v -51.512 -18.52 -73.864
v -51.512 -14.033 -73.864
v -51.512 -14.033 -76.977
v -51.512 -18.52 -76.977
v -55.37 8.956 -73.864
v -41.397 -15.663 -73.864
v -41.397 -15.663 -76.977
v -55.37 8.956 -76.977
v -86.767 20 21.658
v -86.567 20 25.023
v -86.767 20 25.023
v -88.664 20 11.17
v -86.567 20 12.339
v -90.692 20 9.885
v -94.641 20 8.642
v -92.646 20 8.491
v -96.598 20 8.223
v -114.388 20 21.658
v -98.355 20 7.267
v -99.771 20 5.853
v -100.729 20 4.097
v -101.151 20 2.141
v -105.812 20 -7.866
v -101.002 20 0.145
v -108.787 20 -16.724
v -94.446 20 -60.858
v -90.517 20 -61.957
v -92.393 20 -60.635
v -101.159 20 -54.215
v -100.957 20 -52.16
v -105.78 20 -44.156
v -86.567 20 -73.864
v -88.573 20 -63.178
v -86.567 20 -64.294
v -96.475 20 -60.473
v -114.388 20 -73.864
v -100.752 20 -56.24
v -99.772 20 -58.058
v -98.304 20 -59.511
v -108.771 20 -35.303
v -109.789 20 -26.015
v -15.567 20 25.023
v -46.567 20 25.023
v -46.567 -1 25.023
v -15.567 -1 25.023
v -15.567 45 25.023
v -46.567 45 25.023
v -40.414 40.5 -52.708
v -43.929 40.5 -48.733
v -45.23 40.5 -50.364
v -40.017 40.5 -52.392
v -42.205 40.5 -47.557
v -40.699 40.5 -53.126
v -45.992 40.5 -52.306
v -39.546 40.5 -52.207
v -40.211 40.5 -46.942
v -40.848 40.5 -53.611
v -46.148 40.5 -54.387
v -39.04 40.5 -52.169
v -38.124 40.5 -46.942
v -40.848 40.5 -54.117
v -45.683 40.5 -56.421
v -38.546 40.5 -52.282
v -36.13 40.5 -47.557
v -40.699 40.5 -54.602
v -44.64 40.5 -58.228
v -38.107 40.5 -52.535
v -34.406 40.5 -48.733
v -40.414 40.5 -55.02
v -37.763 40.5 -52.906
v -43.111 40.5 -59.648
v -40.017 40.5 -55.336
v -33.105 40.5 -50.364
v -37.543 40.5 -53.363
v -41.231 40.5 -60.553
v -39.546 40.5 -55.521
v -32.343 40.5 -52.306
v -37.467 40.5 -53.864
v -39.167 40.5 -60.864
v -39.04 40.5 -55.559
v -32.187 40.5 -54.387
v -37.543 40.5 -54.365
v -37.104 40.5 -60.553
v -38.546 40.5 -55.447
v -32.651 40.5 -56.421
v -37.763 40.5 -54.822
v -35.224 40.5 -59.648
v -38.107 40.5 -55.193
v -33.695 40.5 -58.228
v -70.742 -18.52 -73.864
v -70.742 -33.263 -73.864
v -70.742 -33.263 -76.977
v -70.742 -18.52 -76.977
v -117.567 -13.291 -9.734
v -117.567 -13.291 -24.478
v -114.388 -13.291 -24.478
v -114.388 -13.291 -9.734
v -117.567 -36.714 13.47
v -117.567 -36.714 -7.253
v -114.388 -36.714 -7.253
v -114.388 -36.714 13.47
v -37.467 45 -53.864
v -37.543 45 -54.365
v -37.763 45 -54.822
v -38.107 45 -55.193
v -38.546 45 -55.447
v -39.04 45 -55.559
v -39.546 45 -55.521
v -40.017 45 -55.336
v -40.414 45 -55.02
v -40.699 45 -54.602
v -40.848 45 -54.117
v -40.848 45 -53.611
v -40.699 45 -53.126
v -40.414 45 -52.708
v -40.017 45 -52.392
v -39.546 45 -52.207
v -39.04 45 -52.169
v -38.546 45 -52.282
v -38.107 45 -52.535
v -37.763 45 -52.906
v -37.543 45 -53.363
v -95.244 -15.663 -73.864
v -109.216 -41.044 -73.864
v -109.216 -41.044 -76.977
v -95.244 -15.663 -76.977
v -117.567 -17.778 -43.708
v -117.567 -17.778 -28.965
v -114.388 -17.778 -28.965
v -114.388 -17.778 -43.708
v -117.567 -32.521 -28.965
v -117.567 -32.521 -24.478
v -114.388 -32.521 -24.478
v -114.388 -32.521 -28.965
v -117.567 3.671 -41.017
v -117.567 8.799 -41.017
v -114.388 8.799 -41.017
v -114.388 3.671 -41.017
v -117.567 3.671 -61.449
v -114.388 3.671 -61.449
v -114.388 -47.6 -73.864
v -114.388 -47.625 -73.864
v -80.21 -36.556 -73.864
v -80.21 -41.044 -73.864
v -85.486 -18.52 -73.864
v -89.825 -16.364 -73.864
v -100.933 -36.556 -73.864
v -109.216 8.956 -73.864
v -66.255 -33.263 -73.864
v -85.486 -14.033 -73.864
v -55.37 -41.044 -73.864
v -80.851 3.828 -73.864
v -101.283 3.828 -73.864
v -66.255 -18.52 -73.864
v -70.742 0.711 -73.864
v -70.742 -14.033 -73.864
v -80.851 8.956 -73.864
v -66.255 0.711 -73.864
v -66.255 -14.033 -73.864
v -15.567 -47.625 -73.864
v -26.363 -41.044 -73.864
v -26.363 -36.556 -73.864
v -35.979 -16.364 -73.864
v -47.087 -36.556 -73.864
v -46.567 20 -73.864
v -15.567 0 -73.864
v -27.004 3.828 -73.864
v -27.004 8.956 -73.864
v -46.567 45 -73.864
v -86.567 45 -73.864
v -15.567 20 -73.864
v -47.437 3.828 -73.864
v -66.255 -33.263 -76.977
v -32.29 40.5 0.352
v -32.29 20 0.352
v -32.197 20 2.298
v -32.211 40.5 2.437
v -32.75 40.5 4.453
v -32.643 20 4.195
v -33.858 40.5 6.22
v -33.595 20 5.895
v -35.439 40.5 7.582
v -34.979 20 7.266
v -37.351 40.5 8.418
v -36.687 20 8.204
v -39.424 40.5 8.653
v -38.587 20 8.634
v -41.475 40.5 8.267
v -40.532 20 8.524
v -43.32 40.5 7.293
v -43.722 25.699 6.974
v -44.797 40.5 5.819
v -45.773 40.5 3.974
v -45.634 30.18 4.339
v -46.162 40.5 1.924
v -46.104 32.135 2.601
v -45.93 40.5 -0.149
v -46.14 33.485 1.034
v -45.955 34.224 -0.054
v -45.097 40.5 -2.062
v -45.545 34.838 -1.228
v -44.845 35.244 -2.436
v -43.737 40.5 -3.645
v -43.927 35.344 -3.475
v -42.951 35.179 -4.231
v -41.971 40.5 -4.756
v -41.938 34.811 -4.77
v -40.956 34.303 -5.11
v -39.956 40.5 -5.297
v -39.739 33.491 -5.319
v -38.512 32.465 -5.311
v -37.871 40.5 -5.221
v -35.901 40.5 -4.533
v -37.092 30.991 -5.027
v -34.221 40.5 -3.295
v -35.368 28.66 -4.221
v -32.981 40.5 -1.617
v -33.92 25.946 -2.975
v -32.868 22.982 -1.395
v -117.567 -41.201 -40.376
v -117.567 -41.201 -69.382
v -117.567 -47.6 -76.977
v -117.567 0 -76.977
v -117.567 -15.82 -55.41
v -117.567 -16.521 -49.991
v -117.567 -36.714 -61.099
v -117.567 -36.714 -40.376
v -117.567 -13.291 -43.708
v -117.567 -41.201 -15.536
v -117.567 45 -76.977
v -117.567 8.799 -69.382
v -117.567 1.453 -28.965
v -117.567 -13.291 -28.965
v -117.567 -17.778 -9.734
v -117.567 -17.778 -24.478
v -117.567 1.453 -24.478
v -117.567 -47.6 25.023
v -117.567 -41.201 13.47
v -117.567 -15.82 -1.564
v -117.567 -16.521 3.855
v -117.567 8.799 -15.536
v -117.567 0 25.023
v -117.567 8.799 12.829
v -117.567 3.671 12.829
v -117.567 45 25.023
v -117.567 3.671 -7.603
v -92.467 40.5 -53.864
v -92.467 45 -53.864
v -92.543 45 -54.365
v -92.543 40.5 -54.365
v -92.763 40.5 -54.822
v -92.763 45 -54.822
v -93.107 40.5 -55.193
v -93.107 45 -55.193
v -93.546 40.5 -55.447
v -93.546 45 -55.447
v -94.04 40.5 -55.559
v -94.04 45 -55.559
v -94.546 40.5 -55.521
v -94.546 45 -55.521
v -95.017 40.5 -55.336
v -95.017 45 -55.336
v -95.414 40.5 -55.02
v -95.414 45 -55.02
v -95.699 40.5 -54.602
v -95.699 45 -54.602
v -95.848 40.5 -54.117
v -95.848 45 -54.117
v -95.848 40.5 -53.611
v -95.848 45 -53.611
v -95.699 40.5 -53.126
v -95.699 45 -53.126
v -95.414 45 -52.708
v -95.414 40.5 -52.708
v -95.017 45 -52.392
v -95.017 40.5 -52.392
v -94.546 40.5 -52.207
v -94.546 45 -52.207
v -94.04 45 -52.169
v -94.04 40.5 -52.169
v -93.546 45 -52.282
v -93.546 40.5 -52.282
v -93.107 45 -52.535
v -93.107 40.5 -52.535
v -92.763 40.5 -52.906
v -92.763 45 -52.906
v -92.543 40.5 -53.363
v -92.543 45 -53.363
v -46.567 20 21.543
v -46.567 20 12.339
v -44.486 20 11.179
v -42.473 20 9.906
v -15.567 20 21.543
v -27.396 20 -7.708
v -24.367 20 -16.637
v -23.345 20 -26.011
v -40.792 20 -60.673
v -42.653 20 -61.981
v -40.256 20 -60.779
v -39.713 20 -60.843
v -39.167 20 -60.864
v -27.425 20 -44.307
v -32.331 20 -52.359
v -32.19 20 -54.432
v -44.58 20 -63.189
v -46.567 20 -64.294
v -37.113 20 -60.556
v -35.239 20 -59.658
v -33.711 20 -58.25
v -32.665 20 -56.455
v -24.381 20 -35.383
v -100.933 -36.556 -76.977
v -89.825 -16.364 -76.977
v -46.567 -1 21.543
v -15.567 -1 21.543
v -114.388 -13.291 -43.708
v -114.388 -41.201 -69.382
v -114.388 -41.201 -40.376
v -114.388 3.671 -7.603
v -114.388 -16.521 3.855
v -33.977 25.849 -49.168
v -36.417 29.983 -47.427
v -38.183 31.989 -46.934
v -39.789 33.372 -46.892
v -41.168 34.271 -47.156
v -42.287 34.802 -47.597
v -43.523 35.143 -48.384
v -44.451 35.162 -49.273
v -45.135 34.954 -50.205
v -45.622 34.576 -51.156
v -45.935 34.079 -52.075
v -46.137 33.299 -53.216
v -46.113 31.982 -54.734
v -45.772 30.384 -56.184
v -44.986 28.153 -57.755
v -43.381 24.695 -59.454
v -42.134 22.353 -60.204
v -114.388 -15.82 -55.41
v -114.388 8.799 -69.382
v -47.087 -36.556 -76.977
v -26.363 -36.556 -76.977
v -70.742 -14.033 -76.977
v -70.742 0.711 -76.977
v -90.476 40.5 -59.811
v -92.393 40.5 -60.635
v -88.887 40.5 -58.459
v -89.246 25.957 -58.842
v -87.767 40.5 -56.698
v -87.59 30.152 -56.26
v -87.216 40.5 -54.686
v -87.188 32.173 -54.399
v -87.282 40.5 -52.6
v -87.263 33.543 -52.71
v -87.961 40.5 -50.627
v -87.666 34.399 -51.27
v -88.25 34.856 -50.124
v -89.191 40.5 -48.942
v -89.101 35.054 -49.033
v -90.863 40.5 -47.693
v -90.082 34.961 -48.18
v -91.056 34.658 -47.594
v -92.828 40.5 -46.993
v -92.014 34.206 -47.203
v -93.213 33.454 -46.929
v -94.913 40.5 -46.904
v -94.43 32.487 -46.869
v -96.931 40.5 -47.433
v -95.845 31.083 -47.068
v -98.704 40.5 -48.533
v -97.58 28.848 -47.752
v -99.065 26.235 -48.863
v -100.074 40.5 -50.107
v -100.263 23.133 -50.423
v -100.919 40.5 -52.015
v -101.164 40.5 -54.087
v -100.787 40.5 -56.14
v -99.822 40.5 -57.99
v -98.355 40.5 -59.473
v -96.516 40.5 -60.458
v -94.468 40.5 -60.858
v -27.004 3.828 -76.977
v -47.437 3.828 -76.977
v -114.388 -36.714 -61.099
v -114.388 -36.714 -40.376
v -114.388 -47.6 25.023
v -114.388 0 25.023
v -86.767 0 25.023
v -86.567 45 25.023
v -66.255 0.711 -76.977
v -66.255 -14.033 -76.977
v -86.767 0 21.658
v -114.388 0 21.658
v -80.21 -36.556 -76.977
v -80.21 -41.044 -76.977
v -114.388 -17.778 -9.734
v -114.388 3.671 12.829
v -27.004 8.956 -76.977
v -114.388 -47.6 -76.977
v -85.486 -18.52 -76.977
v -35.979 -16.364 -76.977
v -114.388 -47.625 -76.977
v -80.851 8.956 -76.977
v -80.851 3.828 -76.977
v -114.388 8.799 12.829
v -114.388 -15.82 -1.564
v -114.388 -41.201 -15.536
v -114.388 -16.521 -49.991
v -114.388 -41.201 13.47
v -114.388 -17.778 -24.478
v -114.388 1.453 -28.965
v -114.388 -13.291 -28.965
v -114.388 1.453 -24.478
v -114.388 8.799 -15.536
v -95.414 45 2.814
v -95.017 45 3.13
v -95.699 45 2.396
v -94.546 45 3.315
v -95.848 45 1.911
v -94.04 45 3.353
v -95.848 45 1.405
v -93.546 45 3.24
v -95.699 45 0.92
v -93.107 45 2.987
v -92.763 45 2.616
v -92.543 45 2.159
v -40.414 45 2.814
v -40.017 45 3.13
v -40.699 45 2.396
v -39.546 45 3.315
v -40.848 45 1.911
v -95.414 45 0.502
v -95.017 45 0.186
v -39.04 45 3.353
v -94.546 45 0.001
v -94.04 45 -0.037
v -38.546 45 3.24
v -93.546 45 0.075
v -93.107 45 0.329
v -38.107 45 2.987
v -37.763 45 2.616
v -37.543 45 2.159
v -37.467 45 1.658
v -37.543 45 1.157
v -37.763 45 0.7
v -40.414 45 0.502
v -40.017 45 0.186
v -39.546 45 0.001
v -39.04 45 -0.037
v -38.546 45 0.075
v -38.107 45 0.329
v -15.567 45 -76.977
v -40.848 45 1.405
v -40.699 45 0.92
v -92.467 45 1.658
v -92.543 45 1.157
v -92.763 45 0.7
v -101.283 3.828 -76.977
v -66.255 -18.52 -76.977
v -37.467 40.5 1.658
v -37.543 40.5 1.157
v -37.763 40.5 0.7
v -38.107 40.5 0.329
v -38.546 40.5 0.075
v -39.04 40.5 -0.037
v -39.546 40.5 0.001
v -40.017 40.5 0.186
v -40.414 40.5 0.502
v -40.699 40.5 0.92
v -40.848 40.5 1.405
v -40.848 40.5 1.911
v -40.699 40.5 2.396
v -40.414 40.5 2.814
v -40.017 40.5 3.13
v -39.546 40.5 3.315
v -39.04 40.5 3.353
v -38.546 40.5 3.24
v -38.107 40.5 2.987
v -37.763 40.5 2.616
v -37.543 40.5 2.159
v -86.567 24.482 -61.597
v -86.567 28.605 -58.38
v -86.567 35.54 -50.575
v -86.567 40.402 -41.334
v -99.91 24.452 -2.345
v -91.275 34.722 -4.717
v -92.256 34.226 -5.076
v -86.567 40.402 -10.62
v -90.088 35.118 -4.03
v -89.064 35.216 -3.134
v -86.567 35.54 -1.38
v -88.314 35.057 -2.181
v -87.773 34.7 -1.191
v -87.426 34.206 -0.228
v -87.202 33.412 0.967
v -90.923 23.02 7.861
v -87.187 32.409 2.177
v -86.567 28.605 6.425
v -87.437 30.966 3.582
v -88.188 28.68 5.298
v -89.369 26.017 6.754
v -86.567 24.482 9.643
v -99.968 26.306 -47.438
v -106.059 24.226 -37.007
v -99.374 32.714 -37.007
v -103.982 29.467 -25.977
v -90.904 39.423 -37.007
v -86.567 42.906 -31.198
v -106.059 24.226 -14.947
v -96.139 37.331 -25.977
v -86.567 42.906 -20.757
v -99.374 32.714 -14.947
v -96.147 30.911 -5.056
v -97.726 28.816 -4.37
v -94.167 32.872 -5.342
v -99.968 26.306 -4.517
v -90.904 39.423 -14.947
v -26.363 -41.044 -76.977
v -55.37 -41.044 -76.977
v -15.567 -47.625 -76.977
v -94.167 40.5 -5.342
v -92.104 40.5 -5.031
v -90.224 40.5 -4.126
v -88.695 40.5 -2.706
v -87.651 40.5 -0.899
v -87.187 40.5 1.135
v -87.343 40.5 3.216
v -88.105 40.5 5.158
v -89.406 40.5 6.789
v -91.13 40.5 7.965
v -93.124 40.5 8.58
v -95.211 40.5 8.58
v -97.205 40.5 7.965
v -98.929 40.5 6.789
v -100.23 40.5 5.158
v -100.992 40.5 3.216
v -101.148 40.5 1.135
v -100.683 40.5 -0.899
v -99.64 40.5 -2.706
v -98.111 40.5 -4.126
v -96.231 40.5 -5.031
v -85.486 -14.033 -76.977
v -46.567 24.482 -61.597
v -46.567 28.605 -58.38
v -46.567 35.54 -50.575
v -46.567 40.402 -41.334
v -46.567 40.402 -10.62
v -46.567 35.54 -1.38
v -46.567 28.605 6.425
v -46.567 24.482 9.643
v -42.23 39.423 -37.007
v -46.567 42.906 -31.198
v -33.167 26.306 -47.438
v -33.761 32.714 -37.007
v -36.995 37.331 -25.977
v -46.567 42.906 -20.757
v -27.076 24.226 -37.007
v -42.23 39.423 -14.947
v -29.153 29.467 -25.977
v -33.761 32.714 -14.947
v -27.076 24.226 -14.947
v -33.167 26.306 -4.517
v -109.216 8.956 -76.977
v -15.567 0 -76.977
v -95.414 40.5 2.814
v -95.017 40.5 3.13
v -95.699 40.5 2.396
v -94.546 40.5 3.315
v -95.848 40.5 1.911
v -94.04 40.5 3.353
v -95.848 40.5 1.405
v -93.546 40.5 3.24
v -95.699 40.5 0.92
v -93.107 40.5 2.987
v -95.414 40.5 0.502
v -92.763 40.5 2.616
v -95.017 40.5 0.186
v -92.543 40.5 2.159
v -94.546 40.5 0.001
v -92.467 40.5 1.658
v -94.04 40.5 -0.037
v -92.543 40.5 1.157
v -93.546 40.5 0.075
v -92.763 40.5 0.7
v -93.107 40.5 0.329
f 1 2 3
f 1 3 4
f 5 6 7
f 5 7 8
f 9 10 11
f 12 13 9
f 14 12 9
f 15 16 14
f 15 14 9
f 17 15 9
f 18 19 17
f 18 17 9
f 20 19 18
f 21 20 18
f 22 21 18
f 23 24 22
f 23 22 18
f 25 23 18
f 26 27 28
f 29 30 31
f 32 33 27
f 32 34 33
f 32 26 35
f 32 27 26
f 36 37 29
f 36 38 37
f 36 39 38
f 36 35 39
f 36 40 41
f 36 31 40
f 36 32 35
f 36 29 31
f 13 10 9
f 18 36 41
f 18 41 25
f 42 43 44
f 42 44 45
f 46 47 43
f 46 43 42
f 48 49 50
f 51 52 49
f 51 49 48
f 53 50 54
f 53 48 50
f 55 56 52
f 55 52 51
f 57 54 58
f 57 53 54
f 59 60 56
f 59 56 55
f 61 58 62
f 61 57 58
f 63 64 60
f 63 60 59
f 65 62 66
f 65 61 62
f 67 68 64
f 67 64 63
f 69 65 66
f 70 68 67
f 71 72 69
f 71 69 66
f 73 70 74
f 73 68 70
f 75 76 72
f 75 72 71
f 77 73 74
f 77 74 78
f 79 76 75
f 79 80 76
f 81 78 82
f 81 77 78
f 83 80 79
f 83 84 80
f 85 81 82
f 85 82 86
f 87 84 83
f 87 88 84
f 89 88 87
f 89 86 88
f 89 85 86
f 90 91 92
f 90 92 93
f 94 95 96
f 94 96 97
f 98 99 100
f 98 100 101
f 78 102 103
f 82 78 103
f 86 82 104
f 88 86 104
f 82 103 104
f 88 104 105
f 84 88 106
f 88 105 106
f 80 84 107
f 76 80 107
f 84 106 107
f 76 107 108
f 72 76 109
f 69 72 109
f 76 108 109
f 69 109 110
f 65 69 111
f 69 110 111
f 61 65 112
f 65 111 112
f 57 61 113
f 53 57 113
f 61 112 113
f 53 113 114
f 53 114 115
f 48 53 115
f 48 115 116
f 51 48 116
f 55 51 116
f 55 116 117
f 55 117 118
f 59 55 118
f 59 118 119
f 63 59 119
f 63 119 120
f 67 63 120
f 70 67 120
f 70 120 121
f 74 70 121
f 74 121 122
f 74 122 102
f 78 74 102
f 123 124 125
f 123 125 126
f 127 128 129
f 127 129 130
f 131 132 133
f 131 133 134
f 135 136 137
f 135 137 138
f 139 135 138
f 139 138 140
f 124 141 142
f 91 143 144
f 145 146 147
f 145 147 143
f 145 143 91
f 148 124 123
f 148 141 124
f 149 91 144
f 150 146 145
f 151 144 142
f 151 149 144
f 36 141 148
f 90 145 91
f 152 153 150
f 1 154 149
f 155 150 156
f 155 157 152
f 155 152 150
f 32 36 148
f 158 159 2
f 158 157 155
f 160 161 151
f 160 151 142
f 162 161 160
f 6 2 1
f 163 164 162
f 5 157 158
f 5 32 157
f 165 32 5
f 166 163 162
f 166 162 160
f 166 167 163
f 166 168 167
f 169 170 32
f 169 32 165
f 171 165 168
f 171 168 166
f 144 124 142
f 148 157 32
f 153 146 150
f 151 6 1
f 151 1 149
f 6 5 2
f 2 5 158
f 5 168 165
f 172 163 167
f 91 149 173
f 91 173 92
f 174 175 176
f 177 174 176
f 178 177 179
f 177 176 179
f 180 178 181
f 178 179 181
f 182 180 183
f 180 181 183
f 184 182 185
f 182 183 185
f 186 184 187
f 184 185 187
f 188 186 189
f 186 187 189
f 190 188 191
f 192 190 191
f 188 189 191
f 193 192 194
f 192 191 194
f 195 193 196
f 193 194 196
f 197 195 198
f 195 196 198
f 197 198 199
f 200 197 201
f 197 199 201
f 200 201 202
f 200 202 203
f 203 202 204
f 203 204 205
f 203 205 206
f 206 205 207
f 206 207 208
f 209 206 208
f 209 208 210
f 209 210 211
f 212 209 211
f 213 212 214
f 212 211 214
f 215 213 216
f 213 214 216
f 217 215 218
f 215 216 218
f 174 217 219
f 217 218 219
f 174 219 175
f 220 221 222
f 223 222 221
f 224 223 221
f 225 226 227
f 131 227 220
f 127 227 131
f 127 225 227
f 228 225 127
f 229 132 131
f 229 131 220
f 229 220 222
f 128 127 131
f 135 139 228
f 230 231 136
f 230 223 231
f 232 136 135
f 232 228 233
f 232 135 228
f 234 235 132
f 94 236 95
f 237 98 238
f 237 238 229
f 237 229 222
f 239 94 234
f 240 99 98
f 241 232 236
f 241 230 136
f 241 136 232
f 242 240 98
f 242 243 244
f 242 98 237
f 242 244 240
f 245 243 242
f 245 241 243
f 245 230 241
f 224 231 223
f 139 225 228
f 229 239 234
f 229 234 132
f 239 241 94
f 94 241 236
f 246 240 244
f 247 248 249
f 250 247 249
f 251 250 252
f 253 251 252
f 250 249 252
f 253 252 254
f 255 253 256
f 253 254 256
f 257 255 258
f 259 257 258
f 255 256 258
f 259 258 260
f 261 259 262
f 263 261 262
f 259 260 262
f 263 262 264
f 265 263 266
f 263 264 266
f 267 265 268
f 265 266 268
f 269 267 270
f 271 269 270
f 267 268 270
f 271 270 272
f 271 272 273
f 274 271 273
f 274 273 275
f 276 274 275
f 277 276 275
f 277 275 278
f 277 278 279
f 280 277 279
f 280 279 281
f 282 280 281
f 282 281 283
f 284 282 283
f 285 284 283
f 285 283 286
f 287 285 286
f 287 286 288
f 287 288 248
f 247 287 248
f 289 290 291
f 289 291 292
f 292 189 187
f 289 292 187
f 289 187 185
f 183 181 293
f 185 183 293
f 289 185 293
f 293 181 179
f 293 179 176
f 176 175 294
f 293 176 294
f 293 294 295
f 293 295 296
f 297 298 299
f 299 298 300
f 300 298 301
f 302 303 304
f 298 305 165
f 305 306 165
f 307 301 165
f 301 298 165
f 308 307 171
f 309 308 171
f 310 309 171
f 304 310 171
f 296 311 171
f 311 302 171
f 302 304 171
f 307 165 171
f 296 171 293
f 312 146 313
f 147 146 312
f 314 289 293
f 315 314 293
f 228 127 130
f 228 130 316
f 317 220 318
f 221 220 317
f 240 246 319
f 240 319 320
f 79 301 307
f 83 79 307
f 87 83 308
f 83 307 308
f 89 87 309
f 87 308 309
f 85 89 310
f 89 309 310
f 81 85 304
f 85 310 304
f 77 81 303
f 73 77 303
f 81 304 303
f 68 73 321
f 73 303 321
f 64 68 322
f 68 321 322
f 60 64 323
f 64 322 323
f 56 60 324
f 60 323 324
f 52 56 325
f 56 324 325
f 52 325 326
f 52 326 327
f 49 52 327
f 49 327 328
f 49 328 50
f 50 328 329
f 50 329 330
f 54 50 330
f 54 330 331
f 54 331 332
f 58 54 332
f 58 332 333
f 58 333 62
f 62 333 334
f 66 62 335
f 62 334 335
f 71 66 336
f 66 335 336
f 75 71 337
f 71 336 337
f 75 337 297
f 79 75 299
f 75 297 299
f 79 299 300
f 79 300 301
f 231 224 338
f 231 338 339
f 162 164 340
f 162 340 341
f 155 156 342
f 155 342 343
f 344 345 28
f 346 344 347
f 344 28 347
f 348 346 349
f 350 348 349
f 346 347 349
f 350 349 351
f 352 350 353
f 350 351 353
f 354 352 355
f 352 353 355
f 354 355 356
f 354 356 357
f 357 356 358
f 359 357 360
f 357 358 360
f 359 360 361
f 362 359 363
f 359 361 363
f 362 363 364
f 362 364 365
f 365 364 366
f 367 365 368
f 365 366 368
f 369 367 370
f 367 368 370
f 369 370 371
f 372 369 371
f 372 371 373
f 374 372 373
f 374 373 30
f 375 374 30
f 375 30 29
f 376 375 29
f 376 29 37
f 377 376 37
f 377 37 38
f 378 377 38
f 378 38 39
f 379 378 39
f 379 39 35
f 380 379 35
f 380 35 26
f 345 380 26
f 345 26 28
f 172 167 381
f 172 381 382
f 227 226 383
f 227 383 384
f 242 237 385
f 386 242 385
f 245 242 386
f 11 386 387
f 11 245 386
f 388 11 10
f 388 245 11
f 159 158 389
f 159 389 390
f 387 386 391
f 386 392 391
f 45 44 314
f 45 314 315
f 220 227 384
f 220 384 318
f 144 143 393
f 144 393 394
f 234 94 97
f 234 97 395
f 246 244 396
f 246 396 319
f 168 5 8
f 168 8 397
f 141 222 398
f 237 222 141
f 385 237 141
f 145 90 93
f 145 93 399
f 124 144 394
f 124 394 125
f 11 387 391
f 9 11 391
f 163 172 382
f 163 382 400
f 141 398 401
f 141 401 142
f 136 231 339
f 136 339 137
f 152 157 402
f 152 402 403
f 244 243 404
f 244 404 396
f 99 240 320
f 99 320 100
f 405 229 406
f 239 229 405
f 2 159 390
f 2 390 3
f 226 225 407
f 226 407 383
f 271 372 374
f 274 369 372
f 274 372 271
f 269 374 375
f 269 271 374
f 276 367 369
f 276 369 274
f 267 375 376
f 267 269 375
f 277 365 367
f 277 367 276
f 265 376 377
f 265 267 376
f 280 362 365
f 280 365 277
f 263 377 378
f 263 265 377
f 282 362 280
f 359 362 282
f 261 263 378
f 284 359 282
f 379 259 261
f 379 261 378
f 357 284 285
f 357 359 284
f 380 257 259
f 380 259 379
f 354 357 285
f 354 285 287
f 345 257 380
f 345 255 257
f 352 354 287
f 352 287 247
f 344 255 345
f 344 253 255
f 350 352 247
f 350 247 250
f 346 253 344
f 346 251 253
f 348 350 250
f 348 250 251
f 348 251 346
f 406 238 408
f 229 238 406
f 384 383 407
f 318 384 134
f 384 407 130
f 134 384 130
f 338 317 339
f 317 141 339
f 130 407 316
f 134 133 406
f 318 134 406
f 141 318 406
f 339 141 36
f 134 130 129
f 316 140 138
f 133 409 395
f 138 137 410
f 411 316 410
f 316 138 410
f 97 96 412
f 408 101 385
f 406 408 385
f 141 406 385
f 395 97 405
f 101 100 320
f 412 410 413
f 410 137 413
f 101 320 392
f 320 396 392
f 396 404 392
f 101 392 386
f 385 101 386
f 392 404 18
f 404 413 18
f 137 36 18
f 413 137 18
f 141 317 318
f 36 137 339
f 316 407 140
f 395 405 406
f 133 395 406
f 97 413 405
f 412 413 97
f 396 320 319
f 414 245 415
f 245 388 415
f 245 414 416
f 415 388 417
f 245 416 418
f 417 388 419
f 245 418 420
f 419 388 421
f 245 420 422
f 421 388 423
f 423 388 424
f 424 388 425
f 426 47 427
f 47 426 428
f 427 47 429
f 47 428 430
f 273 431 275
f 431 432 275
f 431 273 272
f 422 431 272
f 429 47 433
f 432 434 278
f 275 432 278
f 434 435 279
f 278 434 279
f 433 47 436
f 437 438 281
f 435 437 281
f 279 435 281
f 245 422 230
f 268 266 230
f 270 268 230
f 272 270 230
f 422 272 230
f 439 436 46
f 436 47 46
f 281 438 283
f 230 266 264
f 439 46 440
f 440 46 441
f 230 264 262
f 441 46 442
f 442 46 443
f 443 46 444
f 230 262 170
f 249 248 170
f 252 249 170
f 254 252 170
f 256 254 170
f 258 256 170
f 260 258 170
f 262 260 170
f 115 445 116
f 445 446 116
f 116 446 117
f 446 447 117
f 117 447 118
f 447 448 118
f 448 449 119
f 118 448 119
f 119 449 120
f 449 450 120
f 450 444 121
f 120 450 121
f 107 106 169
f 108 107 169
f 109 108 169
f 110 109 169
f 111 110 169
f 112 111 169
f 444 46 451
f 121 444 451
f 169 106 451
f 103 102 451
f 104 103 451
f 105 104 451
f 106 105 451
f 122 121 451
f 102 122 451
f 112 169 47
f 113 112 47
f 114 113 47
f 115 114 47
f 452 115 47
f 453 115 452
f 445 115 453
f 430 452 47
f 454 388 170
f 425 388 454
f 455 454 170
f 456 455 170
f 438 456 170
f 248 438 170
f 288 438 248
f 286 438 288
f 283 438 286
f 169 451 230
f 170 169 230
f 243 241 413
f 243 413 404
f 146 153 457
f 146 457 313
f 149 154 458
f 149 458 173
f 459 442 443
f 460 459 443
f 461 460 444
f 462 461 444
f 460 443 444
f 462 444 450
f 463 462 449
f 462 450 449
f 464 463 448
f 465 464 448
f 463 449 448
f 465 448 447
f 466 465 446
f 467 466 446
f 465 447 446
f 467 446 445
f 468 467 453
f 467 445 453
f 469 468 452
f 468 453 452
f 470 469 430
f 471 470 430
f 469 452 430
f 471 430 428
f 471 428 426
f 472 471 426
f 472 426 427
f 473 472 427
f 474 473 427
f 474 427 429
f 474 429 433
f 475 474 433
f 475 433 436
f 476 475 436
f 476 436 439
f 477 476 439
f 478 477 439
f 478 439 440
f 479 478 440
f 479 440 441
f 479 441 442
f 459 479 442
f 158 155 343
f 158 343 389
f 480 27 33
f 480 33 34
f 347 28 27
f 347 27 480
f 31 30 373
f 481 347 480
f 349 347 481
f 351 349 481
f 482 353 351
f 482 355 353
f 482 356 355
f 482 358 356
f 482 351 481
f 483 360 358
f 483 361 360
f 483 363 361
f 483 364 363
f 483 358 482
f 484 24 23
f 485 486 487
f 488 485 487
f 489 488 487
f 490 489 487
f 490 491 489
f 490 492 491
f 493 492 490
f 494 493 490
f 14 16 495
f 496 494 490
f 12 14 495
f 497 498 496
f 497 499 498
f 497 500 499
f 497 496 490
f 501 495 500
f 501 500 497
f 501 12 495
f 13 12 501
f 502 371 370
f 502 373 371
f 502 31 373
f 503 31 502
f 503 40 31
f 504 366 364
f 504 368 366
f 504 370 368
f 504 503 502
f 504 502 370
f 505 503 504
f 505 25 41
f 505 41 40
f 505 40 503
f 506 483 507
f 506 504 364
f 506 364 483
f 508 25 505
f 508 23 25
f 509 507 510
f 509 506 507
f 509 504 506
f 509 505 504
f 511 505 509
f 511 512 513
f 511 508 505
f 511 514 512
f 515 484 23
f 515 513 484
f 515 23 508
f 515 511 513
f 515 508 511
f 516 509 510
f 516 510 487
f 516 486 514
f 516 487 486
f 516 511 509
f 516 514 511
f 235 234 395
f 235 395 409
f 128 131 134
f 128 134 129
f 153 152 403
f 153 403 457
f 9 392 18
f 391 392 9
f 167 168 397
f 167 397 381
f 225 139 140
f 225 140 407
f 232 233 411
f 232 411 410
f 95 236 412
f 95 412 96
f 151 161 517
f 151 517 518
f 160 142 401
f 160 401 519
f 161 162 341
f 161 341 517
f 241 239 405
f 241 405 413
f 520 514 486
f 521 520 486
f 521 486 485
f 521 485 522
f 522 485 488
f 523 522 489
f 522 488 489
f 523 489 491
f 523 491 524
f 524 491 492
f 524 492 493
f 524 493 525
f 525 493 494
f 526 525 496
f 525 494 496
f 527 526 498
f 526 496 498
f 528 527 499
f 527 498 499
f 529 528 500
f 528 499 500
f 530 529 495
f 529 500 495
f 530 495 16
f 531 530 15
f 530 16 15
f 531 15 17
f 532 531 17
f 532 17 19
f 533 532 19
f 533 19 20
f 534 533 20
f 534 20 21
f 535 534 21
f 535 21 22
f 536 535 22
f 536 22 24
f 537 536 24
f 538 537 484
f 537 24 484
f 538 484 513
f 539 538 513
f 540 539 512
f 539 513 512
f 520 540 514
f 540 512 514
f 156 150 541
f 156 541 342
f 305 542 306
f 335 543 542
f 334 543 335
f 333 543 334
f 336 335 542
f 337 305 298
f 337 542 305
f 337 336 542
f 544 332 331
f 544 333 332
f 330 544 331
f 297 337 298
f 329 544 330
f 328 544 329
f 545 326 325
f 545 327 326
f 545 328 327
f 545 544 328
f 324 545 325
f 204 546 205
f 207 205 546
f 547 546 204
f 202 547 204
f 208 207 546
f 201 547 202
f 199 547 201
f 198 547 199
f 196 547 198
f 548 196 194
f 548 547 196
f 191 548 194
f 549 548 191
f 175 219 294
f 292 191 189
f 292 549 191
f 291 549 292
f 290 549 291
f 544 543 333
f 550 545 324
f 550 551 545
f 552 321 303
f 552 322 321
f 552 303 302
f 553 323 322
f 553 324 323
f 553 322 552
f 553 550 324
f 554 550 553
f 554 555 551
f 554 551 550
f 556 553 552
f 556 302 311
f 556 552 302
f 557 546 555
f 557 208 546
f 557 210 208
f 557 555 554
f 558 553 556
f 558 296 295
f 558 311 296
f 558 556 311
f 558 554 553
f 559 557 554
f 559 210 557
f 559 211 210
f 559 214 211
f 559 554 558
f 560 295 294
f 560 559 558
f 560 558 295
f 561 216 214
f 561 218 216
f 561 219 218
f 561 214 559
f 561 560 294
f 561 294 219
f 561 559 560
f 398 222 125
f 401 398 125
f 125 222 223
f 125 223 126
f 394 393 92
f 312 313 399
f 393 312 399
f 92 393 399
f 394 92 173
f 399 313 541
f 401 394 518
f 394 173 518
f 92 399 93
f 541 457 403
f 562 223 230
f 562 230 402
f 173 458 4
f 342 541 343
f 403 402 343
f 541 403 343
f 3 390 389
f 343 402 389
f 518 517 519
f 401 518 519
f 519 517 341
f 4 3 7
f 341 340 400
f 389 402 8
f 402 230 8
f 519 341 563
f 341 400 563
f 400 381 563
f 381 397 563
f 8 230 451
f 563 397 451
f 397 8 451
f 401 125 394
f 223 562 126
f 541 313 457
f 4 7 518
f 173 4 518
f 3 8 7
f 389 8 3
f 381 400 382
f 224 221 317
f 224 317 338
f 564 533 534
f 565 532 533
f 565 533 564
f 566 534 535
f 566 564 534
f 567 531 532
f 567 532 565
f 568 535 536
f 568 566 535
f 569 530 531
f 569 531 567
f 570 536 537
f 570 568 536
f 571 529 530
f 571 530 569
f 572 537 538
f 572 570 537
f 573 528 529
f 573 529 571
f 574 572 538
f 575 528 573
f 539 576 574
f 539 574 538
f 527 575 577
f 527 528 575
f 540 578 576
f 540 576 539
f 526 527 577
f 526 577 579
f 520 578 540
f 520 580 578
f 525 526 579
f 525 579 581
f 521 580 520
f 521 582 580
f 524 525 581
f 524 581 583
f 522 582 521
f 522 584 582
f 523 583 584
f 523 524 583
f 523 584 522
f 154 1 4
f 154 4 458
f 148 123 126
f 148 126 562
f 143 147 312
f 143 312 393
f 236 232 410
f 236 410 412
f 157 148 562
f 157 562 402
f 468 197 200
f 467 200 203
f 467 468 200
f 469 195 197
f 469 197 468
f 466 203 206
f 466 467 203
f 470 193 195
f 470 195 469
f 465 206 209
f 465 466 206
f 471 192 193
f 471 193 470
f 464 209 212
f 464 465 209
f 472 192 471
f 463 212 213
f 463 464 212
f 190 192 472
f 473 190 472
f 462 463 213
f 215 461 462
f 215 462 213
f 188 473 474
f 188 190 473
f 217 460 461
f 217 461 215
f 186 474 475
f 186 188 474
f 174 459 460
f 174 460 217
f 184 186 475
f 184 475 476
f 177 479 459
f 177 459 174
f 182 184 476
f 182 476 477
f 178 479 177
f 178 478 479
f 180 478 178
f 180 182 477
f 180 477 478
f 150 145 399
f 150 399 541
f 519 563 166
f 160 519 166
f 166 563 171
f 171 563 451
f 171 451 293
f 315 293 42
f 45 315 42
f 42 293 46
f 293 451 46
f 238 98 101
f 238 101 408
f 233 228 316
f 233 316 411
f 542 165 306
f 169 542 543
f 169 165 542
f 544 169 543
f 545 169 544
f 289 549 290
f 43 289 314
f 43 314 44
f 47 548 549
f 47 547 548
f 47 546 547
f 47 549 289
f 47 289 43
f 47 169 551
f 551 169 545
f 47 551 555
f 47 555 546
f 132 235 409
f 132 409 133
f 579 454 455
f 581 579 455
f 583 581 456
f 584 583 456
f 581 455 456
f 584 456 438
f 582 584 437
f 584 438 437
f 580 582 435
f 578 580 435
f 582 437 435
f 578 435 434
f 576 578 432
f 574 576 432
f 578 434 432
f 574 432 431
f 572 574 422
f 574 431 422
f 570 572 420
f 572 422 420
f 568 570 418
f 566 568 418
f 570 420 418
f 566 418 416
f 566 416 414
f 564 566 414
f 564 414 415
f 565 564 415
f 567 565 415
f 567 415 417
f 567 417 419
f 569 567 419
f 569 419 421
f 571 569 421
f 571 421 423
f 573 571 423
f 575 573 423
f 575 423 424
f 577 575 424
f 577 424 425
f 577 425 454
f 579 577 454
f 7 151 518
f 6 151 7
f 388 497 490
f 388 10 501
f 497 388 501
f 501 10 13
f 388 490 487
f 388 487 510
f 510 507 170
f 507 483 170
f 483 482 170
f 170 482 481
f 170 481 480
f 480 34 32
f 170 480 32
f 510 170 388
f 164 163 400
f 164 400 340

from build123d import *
from build123d.topology import SkipClean

# Parameters (mm, degrees)
SKETCH1_W                   = 102
SKETCH1_H                   = 102
BOSS_EXTRUDE1_DEPTH         = 50
CUT_EXTRUDE_THIN1_OUTLINE_W = 40
CUT_EXTRUDE_THIN1_OUTLINE_H = 95.773670058
CUT_EXTRUDE_THIN1_DEPTH     = 50
SKETCH4_W                   = 40
SKETCH4_H                   = 6.202657501
CUT_EXTRUDE3_DEPTH          = 54
SKETCH5_W                   = 33.817621941
SKETCH5_H                   = 102.594578927
CUT_EXTRUDE4_DEPTH          = 20
SKETCH6_W                   = 27.820383201
SKETCH6_H                   = 98.886835029
CUT_EXTRUDE5_DEPTH          = 20
SKETCH7_W                   = 30.8
SKETCH7_H                   = 3.364819678
BOSS_EXTRUDE2_DEPTH         = 21
SKETCH9_W                   = 31
SKETCH9_H                   = 3.479961613
BOSS_EXTRUDE4_DEPTH         = 21
SKETCH11_W                  = 98.820383201
SKETCH11_H                  = 3.113164971
BOSS_EXTRUDE6_DEPTH         = 47.625
SKETCH14_W                  = 102
SKETCH14_H                  = 5
CUT_EXTRUDE7_DEPTH          = 105
SKETCH17_R                  = 7
CUT_EXTRUDE12_DEPTH         = 20.5
M3_CLEARANCE_HOLE1_D        = 3.4
SKETCH22_W                  = 3.179616799
SKETCH22_H                  = 102
BOSS_EXTRUDE7_DEPTH         = 47.6
CUT_EXTRUDE13_DEPTH         = 5
CUT_EXTRUDE14_DEPTH         = 5
CUT_EXTRUDE16_DEPTH         = 5


# Read off the part's stored shape, not the designer's step: Cut-Extrude-Thin1
with BuildPart() as part:
    # Sketch1 → Boss-Extrude1 (new body)
    with BuildSketch(Plane(origin=(0, 0, 0), x_dir=(1, 0, 0), z_dir=(0, 1, 0))):
        with Locations((-66.567363259, 25.977216604)):
            Rectangle(SKETCH1_W, SKETCH1_H)
    extrude(amount=BOSS_EXTRUDE1_DEPTH)

    # Sketch2 → Cut-Revolve1 (revolve, cut)
    with SkipClean():  # the faces are left unmerged after this step: merging them gives an invalid solid
        with BuildSketch(Plane(origin=(0, 0, 0), x_dir=(1, 0, 0), z_dir=(0, 1, 0))):
            with BuildLine():
                ThreePointArc((-66.567363259, 73.602216604), (-114.192363259, 25.977216604), (-66.567363259, -21.647783396))
                Line((-66.567363259, -21.647783396), (-66.567363259, 73.602216604))
            make_face()
            with BuildLine():
                Line((-66.567363259, 73.602216604), (-66.567363259, -21.647783396))
                ThreePointArc((-66.567363259, -21.647783396), (-32.891402805, -7.69874385), (-18.942363259, 25.977216604))
                ThreePointArc((-18.942363259, 25.977216604), (-32.891402805, 59.653177058), (-66.567363259, 73.602216604))
            make_face()
        revolve(axis=Axis((-66.567363259, 0, 21.647783396), (0, 0, -1)), mode=Mode.SUBTRACT)
    add(part.part.scale(1), mode=Mode.REPLACE)  # the faces are merged on a copy

    # Cut-Extrude-Thin1 outline → Cut-Extrude-Thin1 (cut)
    with BuildSketch(Plane(origin=(0, 0, 0), x_dir=(1, 0, 0), z_dir=(0, 1, 0))):
        with Locations((-66.567363259, 25.977216604)):
            Rectangle(CUT_EXTRUDE_THIN1_OUTLINE_W, CUT_EXTRUDE_THIN1_OUTLINE_H)
    extrude(amount=CUT_EXTRUDE_THIN1_DEPTH, mode=Mode.SUBTRACT)

    # Sketch4 → Cut-Extrude3 (cut)
    with BuildSketch(Plane(origin=(0, 0, 0), x_dir=(1, 0, 0), z_dir=(0, 1, 0))):
        with Locations((-66.567363259, -25.010947176)):
            Rectangle(SKETCH4_W, SKETCH4_H)
    extrude(amount=CUT_EXTRUDE3_DEPTH, mode=Mode.SUBTRACT)

    # Sketch5 → Cut-Extrude4 (cut)
    with BuildSketch(Plane(origin=(0, 0, 0), x_dir=(1, 0, 0), z_dir=(0, 1, 0))):
        with Locations((-29.658552289, 22.56676217)):
            Rectangle(SKETCH5_W, SKETCH5_H)
    extrude(amount=CUT_EXTRUDE4_DEPTH, mode=Mode.SUBTRACT)

    # Sketch6 → Cut-Extrude5 (cut)
    with BuildSketch(Plane(origin=(0, 0, 0), x_dir=(-1, 0, 0), z_dir=(0, -1, 0))):
        with Locations((100.47755486, 24.420634119)):
            Rectangle(SKETCH6_W, SKETCH6_H)
    extrude(amount=-CUT_EXTRUDE5_DEPTH, mode=Mode.SUBTRACT)

    # Sketch7 → Boss-Extrude2 (add)
    with BuildSketch(Plane(origin=(0, 0, 0), x_dir=(1, 0, 0), z_dir=(0, 1, 0))):
        with Locations((-102.167363259, -23.340373557)):
            Rectangle(SKETCH7_W, SKETCH7_H)
    extrude(amount=BOSS_EXTRUDE2_DEPTH)

    # Sketch9 → Boss-Extrude4 (add)
    with BuildSketch(Plane.XZ.offset(-20)):
        with Locations((-31.067363259, 23.28280259)):
            Rectangle(SKETCH9_W, SKETCH9_H)
    extrude(amount=BOSS_EXTRUDE4_DEPTH)

    # Sketch11 → Boss-Extrude6 (add)
    with BuildSketch(Plane.XZ):
        with Locations((-64.97755486, -75.420634119)):
            Rectangle(SKETCH11_W, SKETCH11_H)
    extrude(amount=BOSS_EXTRUDE6_DEPTH)

    # Sketch14 → Cut-Extrude7 (cut)
    with BuildSketch(Plane(origin=(-15.567363259, 0, 0), x_dir=(0, 0, -1), z_dir=(1, 0, 0))):
        with Locations((25.977216604, 47.5)):
            Rectangle(SKETCH14_W, SKETCH14_H)
    extrude(amount=-CUT_EXTRUDE7_DEPTH, mode=Mode.SUBTRACT)

    # Sketch17 → Cut-Extrude12 (cut)
    with BuildSketch(Plane.XZ.offset(-20)):
        with Locations(Location((-94.167363259, 1.657963718, 0), (0, 0, 270))):
            Circle(SKETCH17_R)
        with Locations(Location((-94.167363259, -53.864051633, 0), (0, 0, 284.685382437))):
            Circle(SKETCH17_R)
        with Locations(Location((-39.167363259, 1.657963718, 0), (0, 0, 349.246729183))):
            Circle(SKETCH17_R)
        with Locations(Location((-39.167363259, -53.864051633, 0), (0, 0, 270))):
            Circle(SKETCH17_R)
    extrude(amount=-CUT_EXTRUDE12_DEPTH, mode=Mode.SUBTRACT)

    # M3 Clearance Hole1 (through all)
    with Locations(Plane(origin=(0, 40.5, 0), x_dir=(-1, 0, 0), z_dir=(0, -1, 0))):
        with Locations((94.167363259, -1.657963718), (39.167363259, -1.657963718), (39.167363259, 53.864051633), (94.167363259, 53.864051633)):
            Hole(M3_CLEARANCE_HOLE1_D / 2)

    # Sketch22 → Boss-Extrude7 (add)
    with BuildSketch(Plane.XZ):
        with Locations((-115.97755486, -25.977216604)):
            Rectangle(SKETCH22_W, SKETCH22_H)
    extrude(amount=BOSS_EXTRUDE7_DEPTH)

    # Sketch23 → Cut-Extrude13 (cut)
    with BuildSketch(Plane.XY.offset(-73.864051633)):
        Polygon((-80.20953571, -41.043521661), (-109.215945966, -41.043521661), (-95.243590197, -15.662912687), (-109.215945966, 8.956478339), (-80.850561351, 8.956478339), (-80.850561351, 3.828273211), (-101.283253659, 3.828273211), (-89.824920325, -16.364034482), (-100.932692761, -36.556342174), (-80.20953571, -36.556342174), align=None)
        Polygon((-26.363381864, -41.043521661), (-55.36979212, -41.043521661), (-41.397436351, -15.662912687), (-55.36979212, 8.956478339), (-27.004407505, 8.956478339), (-27.004407505, 3.828273211), (-47.437099813, 3.828273211), (-35.978766479, -16.364034482), (-47.086538915, -36.556342174), (-26.363381864, -36.556342174), align=None)
    extrude(amount=-CUT_EXTRUDE13_DEPTH, mode=Mode.SUBTRACT)

    # Sketch24 → Cut-Extrude14 (cut)
    with BuildSketch(Plane.XY.offset(-73.864051633)):
        Polygon((-70.742432906, -14.032687035), (-70.742432906, 0.710902709), (-66.255253419, 0.710902709), (-66.255253419, -14.032687035), (-51.511663676, -14.032687035), (-51.511663676, -18.519866522), (-66.255253419, -18.519866522), (-66.255253419, -33.263456266), (-70.742432906, -33.263456266), (-70.742432906, -18.519866522), (-85.48602265, -18.519866522), (-85.48602265, -14.032687035), align=None)
    extrude(amount=-CUT_EXTRUDE14_DEPTH, mode=Mode.SUBTRACT)

    # Sketch25 → Cut-Extrude16 (cut)
    with BuildSketch(Plane.ZY.offset(117.567363259)):
        Polygon((-40.375666466, -41.200782652), (-69.382076723, -41.200782652), (-55.409720954, -15.820173678), (-69.382076723, 8.799217348), (-41.016692107, 8.799217348), (-41.016692107, 3.67101222), (-61.449384415, 3.67101222), (-49.991051082, -16.521295473), (-61.098823518, -36.713603165), (-40.375666466, -36.713603165), align=None)
        Polygon((13.47048738, -41.200782652), (-15.535922877, -41.200782652), (-1.563567107, -15.820173678), (-15.535922877, 8.799217348), (12.829461739, 8.799217348), (12.829461739, 3.67101222), (-7.603230569, 3.67101222), (3.855102764, -16.521295473), (-7.252669672, -36.713603165), (13.47048738, -36.713603165), align=None)
        Polygon((-28.964861623, -13.290621763), (-28.964861623, 1.452967981), (-24.477682136, 1.452967981), (-24.477682136, -13.290621763), (-9.734092392, -13.290621763), (-9.734092392, -17.77780125), (-24.477682136, -17.77780125), (-24.477682136, -32.521390994), (-28.964861623, -32.521390994), (-28.964861623, -17.77780125), (-43.708451366, -17.77780125), (-43.708451366, -13.290621763), align=None)
    extrude(amount=-CUT_EXTRUDE16_DEPTH, mode=Mode.SUBTRACT)


solid = part.part
